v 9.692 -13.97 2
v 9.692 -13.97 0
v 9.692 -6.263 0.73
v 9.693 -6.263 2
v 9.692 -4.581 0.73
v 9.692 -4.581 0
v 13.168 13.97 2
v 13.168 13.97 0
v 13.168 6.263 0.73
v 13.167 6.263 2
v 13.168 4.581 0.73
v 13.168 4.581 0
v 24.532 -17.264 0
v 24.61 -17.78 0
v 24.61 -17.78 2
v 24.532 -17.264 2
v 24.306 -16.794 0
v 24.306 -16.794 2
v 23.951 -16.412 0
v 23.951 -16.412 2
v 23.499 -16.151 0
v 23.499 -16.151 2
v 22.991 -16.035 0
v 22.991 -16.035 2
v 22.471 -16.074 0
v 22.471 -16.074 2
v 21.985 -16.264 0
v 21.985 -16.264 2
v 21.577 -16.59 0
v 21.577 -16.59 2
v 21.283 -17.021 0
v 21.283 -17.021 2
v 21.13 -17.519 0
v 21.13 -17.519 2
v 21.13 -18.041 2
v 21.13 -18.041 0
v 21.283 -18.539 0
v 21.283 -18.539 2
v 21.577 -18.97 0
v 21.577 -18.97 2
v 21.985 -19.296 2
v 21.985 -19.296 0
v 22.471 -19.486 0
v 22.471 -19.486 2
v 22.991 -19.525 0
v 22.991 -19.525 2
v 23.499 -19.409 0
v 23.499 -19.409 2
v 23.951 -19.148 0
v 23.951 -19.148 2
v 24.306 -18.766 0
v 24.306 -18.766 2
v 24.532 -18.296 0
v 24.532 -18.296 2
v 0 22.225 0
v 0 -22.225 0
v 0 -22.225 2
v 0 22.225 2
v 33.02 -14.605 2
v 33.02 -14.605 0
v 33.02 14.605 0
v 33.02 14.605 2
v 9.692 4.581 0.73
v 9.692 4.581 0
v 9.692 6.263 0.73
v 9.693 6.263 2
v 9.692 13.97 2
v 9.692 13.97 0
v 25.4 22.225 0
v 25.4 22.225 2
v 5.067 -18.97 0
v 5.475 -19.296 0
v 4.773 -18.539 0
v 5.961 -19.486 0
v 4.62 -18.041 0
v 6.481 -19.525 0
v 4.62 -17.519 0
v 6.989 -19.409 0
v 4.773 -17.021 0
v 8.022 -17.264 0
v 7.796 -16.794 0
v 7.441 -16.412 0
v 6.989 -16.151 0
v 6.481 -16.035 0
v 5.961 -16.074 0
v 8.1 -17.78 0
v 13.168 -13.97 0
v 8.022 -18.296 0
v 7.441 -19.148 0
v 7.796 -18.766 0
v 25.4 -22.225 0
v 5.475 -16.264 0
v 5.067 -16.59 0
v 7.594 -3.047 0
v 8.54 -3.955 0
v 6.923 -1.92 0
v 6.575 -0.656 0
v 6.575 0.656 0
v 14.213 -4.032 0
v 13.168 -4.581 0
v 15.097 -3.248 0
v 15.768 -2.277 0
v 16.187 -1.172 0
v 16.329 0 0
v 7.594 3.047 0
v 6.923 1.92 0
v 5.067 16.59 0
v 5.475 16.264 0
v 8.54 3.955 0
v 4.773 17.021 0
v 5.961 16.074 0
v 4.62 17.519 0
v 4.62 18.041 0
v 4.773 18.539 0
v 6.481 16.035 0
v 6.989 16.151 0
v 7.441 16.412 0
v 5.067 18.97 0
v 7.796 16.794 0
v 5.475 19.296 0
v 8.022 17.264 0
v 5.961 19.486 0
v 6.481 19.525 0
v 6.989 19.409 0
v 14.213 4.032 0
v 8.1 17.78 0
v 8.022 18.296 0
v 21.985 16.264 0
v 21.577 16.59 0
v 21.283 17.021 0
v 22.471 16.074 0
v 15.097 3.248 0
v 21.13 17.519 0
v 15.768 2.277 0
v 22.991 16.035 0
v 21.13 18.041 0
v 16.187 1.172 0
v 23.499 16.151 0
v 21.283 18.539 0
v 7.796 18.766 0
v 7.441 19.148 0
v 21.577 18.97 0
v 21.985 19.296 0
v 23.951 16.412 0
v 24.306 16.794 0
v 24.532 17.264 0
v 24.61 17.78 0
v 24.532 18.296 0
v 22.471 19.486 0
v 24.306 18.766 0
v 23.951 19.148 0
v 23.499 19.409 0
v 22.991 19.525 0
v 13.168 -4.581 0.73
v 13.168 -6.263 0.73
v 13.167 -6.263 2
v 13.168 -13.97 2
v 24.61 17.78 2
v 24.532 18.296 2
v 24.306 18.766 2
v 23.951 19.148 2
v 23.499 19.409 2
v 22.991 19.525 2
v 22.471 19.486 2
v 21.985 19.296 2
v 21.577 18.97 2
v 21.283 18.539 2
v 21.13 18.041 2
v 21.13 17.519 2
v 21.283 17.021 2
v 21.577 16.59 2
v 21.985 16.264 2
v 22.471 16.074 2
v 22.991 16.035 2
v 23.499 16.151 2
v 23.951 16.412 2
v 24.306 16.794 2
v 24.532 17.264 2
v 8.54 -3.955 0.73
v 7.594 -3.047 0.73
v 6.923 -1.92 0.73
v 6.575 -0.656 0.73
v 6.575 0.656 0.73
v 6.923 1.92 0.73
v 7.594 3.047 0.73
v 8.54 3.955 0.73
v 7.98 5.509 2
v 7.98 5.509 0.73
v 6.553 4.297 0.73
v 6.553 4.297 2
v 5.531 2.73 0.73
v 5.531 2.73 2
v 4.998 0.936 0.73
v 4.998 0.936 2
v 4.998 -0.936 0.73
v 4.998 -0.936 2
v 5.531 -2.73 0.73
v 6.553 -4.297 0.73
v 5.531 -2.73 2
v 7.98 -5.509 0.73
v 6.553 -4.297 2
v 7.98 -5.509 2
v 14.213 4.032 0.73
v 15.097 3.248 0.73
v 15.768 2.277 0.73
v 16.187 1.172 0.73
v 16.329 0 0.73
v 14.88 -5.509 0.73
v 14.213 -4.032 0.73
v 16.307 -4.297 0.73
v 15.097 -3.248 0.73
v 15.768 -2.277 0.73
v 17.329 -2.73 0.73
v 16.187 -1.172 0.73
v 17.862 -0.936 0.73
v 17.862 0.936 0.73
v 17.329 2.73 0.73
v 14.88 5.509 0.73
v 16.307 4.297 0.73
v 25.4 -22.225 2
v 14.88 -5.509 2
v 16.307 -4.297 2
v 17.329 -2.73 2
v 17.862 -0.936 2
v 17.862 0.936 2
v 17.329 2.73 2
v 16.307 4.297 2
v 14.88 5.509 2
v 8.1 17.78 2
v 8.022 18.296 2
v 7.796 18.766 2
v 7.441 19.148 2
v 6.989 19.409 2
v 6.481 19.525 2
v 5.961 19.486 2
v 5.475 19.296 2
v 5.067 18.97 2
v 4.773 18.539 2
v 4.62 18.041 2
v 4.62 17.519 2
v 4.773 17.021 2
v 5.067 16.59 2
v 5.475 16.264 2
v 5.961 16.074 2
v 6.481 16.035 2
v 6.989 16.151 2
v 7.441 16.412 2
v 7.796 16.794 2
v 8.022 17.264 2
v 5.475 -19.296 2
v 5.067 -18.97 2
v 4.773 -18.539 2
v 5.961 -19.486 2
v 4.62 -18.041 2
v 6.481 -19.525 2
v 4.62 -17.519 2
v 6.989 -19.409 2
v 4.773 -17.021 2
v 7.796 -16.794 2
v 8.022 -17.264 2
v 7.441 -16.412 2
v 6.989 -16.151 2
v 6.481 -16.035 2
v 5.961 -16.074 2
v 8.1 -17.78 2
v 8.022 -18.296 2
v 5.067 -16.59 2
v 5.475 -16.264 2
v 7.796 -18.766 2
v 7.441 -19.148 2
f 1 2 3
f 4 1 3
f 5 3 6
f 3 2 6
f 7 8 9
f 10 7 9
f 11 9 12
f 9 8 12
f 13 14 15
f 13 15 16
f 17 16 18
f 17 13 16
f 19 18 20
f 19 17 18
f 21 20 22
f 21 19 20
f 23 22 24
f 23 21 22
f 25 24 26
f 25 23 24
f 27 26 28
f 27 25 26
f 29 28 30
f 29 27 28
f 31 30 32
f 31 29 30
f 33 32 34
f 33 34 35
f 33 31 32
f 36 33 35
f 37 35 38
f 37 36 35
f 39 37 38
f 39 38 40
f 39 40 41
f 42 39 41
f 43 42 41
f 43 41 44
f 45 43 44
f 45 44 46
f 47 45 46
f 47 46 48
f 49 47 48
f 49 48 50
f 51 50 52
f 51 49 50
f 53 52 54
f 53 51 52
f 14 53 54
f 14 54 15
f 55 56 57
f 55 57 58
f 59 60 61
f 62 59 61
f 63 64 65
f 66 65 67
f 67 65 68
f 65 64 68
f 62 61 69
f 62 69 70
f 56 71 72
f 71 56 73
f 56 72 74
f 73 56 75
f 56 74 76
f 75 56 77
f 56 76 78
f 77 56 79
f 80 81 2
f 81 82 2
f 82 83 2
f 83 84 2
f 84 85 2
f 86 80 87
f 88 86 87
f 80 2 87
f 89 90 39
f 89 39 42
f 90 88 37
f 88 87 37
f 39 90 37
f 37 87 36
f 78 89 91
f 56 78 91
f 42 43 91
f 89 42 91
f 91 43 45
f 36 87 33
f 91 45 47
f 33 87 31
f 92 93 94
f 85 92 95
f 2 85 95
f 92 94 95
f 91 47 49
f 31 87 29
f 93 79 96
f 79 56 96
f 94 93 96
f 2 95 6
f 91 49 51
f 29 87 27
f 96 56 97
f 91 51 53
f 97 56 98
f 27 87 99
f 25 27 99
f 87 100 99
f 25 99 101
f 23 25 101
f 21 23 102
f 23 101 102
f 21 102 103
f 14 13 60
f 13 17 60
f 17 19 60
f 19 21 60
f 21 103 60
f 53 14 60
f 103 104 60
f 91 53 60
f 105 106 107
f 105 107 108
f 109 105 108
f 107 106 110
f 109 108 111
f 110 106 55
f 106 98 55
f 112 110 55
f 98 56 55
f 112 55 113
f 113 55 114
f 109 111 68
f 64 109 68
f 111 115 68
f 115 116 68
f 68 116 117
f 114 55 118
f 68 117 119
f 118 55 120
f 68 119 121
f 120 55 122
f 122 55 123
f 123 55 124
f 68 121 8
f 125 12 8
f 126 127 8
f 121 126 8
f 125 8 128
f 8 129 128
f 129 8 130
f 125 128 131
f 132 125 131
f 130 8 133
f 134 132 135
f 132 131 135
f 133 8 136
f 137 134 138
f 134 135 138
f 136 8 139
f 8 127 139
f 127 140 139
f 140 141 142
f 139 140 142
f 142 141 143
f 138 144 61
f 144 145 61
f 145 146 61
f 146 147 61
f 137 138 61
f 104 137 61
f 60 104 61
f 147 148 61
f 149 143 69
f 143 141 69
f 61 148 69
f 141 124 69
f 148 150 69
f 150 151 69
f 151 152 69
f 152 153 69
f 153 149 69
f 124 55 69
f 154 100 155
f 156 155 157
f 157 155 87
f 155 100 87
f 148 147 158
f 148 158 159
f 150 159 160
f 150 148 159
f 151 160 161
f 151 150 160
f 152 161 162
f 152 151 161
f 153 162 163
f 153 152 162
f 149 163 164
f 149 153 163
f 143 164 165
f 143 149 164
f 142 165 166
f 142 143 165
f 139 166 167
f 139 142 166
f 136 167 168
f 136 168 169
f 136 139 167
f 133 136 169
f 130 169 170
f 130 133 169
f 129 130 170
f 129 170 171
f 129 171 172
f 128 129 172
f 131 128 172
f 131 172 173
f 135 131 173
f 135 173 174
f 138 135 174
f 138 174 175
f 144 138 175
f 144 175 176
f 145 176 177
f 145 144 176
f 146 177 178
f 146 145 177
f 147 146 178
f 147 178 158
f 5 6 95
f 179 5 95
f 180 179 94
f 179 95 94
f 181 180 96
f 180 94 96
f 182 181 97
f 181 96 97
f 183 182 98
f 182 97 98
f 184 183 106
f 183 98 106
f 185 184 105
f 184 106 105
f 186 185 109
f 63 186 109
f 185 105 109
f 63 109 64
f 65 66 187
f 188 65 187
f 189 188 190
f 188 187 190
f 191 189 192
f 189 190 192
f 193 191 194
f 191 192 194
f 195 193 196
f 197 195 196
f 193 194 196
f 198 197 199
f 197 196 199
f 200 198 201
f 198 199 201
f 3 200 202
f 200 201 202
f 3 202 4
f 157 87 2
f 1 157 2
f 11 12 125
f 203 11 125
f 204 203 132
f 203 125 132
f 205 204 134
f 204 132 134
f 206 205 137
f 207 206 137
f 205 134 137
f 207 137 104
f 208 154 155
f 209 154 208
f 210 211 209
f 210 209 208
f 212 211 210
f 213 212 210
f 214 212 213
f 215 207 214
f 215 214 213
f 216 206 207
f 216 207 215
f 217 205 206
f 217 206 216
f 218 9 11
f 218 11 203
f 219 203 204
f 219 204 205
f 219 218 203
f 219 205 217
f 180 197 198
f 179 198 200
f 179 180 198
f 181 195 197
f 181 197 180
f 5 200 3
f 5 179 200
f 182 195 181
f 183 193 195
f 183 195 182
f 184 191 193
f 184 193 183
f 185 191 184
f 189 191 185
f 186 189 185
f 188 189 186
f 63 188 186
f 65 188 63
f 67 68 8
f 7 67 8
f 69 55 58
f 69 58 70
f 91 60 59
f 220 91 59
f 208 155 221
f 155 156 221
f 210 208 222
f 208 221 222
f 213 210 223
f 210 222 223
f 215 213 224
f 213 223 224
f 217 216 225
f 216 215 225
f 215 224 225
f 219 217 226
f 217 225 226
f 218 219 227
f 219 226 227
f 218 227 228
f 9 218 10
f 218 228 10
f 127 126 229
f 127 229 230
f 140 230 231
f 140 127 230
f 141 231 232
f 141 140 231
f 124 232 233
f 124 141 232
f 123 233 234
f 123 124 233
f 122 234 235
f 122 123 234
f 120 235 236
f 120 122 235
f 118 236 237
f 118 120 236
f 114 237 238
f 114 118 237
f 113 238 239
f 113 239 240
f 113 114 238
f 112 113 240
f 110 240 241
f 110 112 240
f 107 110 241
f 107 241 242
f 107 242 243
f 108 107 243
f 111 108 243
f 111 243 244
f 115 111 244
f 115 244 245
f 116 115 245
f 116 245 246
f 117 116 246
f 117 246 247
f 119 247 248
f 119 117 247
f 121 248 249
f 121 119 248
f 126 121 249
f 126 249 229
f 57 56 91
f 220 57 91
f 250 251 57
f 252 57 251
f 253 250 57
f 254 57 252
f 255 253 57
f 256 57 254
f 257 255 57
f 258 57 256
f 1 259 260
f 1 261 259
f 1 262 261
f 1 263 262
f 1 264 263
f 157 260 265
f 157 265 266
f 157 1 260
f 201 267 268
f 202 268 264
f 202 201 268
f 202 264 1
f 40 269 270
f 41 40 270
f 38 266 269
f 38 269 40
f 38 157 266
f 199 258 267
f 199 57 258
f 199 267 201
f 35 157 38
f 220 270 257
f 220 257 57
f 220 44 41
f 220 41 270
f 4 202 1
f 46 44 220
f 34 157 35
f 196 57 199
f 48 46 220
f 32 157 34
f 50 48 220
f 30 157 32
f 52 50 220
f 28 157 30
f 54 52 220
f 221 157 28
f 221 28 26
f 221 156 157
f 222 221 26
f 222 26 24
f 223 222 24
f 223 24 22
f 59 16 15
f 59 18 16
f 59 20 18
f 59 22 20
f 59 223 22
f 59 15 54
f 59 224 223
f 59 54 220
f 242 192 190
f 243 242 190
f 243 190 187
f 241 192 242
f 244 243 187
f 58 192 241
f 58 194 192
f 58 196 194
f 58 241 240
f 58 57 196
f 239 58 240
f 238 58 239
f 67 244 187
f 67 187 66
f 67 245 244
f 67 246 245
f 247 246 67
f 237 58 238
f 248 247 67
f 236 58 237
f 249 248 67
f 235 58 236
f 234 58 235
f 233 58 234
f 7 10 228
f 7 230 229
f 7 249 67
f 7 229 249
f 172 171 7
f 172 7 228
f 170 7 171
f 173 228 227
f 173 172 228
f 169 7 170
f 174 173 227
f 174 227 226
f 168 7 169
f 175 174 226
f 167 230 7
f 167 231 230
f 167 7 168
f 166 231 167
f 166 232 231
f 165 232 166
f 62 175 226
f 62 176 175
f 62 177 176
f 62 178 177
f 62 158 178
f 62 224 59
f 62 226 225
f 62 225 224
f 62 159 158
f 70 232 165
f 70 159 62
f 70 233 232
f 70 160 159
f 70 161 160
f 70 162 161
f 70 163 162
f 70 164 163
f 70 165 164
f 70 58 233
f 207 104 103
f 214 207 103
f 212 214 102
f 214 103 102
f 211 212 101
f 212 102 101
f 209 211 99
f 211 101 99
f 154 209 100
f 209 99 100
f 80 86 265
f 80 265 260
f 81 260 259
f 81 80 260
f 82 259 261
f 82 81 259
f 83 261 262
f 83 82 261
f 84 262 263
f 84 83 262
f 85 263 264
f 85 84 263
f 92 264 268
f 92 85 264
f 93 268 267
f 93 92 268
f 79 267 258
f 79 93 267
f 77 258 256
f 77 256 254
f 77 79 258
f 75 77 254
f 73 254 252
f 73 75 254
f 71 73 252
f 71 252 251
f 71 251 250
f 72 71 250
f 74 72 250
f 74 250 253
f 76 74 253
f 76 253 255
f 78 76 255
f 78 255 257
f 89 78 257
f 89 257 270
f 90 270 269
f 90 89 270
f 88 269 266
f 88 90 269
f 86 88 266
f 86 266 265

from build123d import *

# Parameters (mm, degrees)
F0_W     = 33.02
F0_H     = 44.45
F0_R     = 1.75
F1_DEPTH = 2
F2_SIZE  = 7.62
F3_R     = 6.5
F4_DEPTH = 1.27


with BuildPart() as f1:
    # F0 (on Top) → F1 (new body)
    with BuildSketch(Plane.XY):
        with Locations((16.51, 0)):
            Rectangle(F0_W, F0_H)
        with Locations((6.35, -17.78)):
            Circle(F0_R, mode=Mode.SUBTRACT)
        with Locations((22.86, -17.78)):
            Circle(F0_R, mode=Mode.SUBTRACT)
        with BuildLine():
            ThreePointArc((13.1675, 4.580534), (15.461886, 2.782821), (16.329, 0))
            ThreePointArc((16.329, 0), (15.461886, -2.782821), (13.1675, -4.580534))
            Line((13.1675, -4.580534), (13.1675, -13.97))
            Line((13.1675, -13.97), (11.43, -13.97))
            Line((11.43, -13.97), (9.6925, -13.97))
            Line((9.6925, -13.97), (9.6925, -4.580534))
            ThreePointArc((9.6925, -4.580534), (6.531, 0), (9.6925, 4.580534))
            Line((9.6925, 4.580534), (9.6925, 13.97))
            Line((9.6925, 13.97), (11.43, 13.97))
            Line((11.43, 13.97), (13.1675, 13.97))
            Line((13.1675, 13.97), (13.1675, 4.580534))
        make_face(mode=Mode.SUBTRACT)
        with Locations((6.35, 17.78)):
            Circle(F0_R, mode=Mode.SUBTRACT)
        with Locations((22.86, 17.78)):
            Circle(F0_R, mode=Mode.SUBTRACT)
    extrude(amount=F1_DEPTH)

    # F2
    f2_edges = [f1.edges().sort_by_distance(p)[0] for p in [
        (33.02, -22.225, 1),
        (33.02, 22.225, 1),
    ]]
    chamfer(f2_edges, length=F2_SIZE)

    # F3 (on face) → F4 (cut)
    with BuildSketch(Plane.XY.offset(2)):
        with Locations((11.43, 0)):
            Circle(F3_R)
    extrude(amount=-F4_DEPTH, mode=Mode.SUBTRACT)


solid = f1.part
